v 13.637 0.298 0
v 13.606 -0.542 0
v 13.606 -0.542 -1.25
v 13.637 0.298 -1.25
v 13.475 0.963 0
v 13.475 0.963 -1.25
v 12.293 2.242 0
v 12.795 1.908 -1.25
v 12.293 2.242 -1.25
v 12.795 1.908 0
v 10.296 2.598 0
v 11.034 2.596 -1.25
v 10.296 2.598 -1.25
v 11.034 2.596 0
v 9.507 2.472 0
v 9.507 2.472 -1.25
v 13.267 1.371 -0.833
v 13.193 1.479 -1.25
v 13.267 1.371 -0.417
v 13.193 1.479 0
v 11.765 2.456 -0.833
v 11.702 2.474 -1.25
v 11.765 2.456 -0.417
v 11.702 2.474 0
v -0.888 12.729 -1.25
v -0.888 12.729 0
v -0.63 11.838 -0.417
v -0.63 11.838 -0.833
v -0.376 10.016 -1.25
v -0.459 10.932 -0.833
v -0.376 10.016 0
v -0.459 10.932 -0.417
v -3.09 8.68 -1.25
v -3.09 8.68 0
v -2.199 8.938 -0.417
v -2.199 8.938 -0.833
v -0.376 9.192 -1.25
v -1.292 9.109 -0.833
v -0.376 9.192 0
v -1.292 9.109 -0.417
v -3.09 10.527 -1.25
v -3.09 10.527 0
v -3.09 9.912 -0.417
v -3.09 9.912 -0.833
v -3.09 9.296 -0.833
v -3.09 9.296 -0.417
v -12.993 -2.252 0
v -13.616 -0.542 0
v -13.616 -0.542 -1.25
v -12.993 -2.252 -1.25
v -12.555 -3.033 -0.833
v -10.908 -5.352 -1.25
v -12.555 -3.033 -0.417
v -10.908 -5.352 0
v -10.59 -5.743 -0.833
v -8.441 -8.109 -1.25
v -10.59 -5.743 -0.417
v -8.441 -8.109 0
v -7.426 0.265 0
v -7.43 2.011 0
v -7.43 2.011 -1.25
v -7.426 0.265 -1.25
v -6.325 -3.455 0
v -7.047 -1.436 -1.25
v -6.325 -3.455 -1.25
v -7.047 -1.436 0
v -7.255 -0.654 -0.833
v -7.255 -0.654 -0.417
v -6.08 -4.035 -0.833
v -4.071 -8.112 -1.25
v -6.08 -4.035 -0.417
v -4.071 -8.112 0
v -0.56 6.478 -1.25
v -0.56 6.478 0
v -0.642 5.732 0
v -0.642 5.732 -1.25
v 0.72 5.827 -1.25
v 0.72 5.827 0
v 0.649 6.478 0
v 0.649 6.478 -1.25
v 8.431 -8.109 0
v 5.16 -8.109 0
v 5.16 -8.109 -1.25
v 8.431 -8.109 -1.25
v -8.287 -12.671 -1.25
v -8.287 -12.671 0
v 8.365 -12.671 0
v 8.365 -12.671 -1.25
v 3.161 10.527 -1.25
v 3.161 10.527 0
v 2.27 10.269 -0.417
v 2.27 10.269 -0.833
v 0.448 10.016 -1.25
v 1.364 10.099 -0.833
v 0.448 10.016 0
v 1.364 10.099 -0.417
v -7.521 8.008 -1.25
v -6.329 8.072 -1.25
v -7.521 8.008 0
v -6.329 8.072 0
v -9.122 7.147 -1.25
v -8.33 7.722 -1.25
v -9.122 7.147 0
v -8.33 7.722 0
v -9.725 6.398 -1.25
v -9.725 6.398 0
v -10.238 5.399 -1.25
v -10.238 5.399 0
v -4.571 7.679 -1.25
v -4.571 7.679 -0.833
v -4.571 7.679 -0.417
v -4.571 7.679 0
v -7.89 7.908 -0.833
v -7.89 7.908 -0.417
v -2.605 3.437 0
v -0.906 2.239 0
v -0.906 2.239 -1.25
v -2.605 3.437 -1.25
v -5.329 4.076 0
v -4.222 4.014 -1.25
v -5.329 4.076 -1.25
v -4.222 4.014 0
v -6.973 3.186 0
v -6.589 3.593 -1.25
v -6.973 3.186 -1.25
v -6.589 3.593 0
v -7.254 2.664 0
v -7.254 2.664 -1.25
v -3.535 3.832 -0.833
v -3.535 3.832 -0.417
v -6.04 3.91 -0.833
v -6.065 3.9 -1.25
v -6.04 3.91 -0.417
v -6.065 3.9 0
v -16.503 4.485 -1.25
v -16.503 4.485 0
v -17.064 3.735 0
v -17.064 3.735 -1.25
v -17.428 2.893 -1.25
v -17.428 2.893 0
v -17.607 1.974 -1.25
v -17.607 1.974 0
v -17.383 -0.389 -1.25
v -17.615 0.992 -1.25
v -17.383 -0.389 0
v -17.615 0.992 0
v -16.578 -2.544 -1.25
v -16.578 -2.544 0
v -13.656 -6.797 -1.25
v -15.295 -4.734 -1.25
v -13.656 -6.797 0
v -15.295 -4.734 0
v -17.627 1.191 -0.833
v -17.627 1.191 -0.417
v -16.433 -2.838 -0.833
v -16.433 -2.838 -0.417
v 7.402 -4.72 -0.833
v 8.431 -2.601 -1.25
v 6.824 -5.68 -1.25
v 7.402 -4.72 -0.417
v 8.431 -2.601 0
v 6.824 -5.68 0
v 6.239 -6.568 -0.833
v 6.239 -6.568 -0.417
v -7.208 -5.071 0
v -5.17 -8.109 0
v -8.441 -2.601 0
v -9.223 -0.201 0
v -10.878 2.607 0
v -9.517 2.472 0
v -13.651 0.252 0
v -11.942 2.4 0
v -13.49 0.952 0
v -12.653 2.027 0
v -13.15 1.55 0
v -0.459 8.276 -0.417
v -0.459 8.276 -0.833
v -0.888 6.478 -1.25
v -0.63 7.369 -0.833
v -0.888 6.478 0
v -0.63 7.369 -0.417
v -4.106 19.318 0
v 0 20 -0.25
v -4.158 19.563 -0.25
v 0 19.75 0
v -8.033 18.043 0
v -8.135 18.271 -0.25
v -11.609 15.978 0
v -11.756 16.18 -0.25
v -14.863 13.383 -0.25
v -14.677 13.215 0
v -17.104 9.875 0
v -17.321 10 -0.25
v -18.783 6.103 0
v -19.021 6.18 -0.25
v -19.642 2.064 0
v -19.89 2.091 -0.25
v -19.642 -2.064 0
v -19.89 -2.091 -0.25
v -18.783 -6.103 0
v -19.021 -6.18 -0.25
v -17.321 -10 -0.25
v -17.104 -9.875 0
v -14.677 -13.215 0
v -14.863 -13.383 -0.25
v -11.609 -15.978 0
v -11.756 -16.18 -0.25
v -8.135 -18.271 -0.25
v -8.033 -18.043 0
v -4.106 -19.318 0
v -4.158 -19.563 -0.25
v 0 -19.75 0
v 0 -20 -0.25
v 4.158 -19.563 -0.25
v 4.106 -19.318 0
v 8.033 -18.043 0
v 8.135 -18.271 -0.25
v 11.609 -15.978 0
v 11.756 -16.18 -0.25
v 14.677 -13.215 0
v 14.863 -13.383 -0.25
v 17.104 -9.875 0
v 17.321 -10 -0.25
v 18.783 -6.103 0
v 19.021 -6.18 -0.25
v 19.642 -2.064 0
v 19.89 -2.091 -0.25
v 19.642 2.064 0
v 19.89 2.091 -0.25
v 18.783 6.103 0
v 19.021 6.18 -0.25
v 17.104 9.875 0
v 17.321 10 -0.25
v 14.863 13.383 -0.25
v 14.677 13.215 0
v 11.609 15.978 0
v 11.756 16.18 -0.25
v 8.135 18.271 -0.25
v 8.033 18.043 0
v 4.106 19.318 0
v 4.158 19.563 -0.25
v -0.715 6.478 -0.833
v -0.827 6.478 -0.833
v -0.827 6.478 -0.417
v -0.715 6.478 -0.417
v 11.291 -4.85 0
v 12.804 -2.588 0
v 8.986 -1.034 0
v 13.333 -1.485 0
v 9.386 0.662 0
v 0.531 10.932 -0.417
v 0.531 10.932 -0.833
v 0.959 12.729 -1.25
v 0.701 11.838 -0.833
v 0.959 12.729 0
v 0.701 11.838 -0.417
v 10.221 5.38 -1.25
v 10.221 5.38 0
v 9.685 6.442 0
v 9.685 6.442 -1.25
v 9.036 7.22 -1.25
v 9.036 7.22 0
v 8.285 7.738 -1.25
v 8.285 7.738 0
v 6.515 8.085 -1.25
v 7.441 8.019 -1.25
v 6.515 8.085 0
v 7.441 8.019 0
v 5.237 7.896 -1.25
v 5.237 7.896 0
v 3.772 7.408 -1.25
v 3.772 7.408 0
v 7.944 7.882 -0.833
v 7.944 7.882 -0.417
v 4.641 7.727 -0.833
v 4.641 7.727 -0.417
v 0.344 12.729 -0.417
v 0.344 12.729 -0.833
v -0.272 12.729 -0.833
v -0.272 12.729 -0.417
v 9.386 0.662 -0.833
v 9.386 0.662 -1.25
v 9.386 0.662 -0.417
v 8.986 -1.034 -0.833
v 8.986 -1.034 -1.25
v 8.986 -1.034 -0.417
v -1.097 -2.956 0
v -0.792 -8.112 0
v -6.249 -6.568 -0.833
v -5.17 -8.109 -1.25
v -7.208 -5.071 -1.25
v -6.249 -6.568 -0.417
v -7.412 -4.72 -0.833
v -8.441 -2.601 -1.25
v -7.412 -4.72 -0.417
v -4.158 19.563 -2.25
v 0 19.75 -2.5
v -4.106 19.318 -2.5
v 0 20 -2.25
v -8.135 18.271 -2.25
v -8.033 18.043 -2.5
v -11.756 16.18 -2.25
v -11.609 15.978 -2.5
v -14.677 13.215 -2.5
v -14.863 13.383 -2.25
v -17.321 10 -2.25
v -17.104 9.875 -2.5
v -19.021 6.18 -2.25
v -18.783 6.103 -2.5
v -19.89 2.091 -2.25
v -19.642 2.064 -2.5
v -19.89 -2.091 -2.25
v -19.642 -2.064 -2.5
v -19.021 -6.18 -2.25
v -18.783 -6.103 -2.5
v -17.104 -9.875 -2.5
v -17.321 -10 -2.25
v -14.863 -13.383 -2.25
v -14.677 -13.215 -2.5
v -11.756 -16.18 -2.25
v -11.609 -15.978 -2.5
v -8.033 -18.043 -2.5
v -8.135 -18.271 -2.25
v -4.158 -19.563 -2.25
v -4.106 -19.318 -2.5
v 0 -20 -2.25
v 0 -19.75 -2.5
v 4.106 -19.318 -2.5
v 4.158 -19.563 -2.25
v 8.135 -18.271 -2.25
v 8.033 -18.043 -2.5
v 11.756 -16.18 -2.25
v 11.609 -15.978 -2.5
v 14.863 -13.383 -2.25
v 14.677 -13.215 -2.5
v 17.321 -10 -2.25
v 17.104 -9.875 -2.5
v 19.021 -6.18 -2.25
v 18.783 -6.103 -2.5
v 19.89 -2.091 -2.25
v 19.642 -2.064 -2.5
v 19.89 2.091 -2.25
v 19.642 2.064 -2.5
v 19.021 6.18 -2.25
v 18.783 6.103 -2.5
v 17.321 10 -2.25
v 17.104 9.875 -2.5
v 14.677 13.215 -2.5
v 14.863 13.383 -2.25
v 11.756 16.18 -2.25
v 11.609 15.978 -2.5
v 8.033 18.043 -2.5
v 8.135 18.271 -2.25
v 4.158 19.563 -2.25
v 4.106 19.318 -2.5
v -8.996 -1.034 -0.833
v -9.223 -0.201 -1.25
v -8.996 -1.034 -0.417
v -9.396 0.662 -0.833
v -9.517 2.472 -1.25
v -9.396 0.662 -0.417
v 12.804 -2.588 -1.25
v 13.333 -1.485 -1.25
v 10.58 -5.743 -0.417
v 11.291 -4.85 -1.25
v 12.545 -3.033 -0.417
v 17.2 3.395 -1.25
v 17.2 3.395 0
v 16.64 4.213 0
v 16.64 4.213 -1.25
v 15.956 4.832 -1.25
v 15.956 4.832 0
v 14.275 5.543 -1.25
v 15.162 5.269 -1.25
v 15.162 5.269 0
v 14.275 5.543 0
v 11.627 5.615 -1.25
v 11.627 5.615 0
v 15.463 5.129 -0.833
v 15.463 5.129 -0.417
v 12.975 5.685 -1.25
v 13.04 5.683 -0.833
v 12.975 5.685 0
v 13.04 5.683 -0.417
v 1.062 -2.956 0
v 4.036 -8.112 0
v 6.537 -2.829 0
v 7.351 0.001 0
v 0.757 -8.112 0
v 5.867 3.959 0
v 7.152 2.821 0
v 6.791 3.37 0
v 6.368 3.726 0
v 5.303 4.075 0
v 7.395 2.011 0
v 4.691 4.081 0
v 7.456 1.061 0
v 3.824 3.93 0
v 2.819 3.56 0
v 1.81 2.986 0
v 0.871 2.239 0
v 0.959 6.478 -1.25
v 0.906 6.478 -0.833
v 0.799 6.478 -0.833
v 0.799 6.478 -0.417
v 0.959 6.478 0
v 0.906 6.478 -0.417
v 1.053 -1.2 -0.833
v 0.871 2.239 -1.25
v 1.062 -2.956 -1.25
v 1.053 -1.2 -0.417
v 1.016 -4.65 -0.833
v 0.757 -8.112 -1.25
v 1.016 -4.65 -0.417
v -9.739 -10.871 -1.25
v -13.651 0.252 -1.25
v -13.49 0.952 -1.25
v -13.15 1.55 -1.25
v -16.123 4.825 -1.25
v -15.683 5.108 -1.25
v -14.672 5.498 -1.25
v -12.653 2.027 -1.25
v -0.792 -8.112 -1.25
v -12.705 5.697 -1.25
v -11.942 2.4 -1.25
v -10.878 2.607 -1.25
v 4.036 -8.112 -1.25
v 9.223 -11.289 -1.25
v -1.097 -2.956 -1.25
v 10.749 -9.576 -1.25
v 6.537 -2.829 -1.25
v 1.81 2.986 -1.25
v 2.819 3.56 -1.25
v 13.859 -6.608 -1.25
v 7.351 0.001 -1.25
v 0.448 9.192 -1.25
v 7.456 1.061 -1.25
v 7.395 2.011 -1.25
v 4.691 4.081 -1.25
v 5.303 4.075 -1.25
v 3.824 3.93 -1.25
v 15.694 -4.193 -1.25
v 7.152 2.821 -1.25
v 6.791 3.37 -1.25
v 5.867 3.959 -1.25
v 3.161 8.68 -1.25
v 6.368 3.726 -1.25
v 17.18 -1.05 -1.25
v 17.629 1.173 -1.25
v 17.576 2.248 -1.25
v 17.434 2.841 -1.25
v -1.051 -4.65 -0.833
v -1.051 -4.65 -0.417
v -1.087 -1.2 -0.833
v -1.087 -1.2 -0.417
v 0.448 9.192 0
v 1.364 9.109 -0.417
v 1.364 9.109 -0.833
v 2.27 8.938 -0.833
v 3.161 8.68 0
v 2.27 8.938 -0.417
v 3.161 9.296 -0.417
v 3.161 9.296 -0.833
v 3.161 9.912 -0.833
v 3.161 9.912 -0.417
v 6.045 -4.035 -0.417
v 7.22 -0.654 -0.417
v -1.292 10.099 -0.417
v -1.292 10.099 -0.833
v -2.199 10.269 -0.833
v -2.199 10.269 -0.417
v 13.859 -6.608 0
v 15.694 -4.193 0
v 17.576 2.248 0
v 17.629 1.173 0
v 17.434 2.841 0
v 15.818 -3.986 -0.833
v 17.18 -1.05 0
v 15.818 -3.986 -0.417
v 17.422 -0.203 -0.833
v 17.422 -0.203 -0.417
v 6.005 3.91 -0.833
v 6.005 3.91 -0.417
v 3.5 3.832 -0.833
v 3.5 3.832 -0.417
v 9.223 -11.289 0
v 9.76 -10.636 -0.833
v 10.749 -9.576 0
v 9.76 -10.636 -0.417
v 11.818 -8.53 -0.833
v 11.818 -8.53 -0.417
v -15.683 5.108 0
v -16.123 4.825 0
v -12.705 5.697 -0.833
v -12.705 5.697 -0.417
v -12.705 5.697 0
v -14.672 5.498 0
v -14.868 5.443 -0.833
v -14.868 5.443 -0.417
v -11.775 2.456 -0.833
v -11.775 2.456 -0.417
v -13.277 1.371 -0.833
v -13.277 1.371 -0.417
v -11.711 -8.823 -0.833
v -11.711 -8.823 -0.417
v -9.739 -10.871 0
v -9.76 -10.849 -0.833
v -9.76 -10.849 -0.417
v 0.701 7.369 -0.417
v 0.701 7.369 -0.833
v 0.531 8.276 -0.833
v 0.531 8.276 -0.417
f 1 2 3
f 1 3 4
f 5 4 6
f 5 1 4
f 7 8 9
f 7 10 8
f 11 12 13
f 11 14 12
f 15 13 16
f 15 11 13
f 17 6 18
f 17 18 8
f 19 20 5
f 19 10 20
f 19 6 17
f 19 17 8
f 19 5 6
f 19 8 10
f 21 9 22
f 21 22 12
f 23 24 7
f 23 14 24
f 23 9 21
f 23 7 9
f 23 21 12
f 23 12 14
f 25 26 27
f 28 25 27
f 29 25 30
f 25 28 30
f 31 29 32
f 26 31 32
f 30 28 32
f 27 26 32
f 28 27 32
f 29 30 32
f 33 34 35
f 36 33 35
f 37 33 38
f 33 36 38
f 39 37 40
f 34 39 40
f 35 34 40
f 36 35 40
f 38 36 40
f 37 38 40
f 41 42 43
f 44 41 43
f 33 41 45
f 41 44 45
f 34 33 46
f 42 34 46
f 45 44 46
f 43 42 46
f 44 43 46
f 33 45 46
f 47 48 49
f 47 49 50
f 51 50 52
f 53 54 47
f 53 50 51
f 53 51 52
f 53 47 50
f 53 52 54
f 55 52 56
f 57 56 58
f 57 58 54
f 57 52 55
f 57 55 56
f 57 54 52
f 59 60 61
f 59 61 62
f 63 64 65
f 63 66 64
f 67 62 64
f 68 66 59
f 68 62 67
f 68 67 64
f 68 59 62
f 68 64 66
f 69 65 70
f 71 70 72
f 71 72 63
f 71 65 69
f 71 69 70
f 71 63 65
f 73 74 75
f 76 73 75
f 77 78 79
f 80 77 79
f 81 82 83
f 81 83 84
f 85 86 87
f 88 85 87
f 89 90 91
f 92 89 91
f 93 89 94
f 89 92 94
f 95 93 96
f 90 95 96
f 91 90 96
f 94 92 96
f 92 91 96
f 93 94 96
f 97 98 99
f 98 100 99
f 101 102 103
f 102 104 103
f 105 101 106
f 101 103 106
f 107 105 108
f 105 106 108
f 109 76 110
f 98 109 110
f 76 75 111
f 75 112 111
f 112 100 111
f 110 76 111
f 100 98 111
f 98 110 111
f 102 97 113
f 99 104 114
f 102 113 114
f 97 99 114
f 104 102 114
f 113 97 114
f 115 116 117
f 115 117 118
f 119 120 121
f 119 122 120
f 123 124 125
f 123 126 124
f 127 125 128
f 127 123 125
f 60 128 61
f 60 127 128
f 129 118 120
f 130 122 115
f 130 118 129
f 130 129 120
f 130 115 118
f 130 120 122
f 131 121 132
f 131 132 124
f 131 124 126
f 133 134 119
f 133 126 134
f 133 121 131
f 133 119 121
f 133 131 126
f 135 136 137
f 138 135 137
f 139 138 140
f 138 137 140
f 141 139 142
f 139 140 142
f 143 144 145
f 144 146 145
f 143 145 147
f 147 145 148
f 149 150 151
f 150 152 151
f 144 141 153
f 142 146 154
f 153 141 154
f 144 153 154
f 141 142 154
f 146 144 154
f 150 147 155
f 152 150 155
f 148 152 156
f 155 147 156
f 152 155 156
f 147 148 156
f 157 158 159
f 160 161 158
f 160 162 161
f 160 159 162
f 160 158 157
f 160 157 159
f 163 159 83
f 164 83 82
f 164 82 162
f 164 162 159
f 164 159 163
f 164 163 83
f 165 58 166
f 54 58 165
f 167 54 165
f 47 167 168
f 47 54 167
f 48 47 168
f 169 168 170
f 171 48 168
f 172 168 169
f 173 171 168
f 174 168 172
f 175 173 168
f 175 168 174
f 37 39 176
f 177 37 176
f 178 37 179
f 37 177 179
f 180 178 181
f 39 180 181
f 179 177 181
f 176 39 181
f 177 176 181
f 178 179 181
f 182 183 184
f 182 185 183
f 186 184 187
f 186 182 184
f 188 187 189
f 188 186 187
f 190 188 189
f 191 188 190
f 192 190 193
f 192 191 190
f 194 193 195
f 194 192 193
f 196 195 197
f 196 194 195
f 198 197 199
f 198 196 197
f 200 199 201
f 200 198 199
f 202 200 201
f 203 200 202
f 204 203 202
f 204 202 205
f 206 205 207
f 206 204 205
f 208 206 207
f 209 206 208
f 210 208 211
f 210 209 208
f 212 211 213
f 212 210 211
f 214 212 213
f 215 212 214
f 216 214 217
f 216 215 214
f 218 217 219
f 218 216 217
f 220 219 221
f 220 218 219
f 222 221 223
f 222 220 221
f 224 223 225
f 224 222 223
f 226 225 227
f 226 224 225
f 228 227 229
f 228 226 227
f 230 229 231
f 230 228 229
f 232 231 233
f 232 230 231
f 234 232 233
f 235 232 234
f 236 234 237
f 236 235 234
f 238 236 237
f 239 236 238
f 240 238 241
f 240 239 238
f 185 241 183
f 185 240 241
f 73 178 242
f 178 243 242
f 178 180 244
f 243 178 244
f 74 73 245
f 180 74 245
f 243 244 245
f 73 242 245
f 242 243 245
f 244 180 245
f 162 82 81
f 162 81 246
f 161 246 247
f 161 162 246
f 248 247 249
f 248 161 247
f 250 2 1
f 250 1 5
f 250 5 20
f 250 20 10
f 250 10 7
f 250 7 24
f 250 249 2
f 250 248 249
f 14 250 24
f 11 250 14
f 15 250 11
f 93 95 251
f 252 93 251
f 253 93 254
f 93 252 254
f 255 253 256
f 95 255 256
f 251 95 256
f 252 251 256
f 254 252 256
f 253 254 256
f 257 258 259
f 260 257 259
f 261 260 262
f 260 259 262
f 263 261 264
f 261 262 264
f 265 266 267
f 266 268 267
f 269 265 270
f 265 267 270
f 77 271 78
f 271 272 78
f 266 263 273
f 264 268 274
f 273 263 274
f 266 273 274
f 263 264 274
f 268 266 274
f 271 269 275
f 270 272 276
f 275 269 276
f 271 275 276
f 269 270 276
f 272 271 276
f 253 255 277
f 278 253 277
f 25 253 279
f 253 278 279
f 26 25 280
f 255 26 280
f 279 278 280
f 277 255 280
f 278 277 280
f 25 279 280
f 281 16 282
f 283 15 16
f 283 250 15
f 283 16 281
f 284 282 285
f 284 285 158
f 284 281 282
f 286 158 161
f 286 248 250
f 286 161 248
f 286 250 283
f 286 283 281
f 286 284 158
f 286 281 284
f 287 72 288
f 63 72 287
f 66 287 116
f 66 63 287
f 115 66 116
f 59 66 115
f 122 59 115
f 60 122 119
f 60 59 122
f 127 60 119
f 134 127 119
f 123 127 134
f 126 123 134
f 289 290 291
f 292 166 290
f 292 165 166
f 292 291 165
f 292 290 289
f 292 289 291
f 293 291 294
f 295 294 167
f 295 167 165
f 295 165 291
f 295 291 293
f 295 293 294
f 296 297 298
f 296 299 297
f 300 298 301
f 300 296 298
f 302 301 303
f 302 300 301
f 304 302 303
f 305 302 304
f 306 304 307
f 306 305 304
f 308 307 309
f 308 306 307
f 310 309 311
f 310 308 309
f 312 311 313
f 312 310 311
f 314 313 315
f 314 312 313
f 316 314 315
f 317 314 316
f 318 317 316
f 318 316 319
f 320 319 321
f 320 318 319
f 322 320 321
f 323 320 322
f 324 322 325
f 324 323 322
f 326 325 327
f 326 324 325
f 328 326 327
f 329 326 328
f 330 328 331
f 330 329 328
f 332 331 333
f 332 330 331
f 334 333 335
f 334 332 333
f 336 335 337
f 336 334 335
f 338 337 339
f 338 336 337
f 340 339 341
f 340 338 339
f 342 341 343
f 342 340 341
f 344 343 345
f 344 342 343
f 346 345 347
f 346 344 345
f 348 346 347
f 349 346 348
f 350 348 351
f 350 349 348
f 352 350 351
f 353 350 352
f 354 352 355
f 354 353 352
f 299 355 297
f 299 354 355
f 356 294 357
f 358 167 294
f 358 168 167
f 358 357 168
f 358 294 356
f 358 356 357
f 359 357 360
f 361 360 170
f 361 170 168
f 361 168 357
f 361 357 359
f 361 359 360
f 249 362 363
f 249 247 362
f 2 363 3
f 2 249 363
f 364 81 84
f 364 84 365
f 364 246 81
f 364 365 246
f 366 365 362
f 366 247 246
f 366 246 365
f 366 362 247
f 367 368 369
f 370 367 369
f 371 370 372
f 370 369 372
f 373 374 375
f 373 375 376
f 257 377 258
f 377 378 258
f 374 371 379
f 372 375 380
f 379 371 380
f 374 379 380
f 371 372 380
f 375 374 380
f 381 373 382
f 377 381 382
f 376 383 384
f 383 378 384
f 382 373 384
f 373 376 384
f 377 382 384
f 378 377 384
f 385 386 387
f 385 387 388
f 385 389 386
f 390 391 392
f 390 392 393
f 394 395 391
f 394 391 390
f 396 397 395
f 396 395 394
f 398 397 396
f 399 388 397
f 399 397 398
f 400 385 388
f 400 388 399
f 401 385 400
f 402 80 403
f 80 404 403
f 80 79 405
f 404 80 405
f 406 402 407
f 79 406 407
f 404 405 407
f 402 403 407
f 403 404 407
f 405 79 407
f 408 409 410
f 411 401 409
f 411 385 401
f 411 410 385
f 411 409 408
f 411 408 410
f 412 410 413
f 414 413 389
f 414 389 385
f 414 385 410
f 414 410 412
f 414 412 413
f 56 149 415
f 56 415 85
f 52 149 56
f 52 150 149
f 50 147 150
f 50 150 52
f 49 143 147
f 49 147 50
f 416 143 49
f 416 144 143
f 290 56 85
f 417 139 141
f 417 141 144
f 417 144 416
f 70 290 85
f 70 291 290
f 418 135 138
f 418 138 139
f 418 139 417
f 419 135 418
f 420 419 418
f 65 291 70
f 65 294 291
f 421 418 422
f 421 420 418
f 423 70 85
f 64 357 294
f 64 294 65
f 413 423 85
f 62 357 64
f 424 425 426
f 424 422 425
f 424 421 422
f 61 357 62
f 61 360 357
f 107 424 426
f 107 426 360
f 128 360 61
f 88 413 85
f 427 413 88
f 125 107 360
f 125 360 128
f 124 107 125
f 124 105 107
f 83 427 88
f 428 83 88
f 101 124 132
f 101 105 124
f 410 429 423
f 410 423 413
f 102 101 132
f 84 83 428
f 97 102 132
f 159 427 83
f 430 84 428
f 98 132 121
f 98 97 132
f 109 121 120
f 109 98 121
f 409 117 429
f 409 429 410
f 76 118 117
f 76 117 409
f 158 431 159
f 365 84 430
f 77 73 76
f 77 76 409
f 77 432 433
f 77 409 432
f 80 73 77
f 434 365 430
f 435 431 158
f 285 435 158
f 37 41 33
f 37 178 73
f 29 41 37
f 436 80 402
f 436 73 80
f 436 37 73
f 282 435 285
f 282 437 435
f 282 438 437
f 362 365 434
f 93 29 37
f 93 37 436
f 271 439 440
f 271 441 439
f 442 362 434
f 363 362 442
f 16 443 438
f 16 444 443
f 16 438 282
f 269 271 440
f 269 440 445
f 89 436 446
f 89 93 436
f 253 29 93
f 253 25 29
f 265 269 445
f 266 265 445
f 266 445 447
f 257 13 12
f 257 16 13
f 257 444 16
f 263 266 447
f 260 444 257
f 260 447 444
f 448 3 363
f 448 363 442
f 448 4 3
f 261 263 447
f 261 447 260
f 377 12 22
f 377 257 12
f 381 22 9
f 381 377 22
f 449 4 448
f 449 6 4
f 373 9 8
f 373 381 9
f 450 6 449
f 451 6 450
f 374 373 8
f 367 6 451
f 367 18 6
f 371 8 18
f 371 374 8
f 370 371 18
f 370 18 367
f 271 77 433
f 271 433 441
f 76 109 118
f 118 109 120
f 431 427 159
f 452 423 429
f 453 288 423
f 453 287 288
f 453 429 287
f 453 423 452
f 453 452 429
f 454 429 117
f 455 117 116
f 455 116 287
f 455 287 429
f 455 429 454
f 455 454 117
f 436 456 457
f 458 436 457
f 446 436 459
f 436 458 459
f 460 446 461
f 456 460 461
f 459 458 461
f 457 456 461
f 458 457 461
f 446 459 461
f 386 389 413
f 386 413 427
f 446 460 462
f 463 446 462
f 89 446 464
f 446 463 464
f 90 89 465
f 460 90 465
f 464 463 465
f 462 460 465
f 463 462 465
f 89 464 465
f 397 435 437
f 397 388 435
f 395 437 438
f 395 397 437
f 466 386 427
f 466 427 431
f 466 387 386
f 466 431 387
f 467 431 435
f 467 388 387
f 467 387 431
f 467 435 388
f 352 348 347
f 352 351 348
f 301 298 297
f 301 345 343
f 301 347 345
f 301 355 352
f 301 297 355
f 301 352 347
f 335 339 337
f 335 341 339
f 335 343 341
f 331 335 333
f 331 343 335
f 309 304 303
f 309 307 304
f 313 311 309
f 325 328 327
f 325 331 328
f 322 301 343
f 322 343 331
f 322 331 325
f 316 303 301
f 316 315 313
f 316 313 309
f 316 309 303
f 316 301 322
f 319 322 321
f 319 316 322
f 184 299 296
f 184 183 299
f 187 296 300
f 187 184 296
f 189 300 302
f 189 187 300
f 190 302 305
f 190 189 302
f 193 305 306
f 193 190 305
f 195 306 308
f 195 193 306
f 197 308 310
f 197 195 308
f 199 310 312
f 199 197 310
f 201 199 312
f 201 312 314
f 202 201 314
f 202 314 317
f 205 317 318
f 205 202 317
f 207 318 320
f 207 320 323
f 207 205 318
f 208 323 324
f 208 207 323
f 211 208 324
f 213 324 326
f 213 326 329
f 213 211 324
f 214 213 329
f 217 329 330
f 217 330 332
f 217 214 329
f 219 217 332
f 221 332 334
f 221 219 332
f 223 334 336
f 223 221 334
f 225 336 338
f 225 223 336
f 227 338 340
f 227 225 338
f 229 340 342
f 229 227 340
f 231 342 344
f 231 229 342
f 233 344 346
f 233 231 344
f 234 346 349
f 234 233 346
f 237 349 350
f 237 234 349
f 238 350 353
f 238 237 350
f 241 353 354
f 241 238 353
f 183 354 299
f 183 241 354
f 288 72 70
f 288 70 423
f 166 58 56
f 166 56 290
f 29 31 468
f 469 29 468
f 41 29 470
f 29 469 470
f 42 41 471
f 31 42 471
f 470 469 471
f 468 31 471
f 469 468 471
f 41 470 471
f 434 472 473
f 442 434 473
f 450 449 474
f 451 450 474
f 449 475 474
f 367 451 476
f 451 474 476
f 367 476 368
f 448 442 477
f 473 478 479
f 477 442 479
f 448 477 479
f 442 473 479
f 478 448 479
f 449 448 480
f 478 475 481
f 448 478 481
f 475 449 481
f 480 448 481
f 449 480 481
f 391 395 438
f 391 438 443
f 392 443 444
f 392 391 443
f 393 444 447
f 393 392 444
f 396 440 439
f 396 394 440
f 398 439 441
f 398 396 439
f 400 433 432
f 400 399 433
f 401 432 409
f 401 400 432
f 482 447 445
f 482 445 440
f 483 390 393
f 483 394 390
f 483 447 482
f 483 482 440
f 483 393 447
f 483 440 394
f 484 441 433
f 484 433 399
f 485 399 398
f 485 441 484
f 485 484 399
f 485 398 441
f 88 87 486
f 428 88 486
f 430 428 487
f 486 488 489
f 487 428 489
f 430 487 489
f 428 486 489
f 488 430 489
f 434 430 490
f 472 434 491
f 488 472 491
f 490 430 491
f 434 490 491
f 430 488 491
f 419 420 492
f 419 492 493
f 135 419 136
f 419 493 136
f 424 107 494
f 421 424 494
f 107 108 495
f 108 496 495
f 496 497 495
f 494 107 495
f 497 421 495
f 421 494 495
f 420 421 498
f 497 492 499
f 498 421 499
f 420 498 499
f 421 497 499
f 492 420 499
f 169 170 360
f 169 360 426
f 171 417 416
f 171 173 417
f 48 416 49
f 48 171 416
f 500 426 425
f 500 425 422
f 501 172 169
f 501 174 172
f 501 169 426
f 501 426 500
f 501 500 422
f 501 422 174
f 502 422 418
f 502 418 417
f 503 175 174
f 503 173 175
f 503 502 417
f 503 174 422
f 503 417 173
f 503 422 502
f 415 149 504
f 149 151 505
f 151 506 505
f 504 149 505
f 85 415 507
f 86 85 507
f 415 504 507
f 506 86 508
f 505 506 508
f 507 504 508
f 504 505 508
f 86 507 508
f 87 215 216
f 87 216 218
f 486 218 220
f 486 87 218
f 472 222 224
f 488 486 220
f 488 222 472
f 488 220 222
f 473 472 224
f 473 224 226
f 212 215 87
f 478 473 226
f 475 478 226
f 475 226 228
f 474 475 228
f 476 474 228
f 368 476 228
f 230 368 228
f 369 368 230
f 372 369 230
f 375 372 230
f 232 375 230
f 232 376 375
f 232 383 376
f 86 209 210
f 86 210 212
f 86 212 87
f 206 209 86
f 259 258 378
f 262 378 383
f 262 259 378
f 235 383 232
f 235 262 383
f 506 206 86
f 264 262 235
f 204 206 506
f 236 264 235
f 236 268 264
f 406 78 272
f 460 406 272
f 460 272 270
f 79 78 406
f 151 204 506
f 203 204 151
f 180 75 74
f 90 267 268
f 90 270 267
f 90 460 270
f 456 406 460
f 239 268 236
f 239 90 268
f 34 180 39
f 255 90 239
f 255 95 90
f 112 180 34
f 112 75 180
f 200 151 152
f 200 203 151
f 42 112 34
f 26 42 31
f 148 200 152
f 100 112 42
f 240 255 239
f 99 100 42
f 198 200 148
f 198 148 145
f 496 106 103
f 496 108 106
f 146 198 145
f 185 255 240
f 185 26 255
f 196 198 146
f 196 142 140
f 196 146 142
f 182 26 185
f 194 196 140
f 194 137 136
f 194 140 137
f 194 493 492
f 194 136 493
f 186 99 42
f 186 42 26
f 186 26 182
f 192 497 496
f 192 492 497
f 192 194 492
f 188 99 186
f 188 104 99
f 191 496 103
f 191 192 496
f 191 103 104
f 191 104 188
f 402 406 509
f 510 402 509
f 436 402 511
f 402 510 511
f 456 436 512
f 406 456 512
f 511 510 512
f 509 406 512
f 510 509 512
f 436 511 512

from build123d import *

# Parameters (mm, degrees)
POCKET_DEPTH = 1.25


with BuildPart() as part:
    # Sketch (on DatumPlane) → Revolution (revolve)
    with BuildSketch(Plane.YZ):
        Polygon((0, 0), (0, -2.5), (19.75, -2.5), (20, -2.25), (20, -0.25), (19.75, 0), align=None)
    revolve(axis=Axis((0, 0, 0), (0, 0, 1)))

    # Sketch005 → Pocket (cut)
    with BuildSketch(Plane.XY):
        with BuildLine():
            add(Edge.make_bspline(
                [(17.199673, 3.39502), (15.904895, 5.827494), (13.139208, 6.003619), (10.22119, 5.380033)],
                knots=[0, 0, 0, 0, 1, 1, 1, 1], degree=3))
            add(Edge.make_bspline(
                [(10.22119, 5.380033), (8.593193, 9.516663), (4.81358, 8.293289), (0.719788, 5.827494)],
                knots=[0, 0, 0, 0, 1, 1, 1, 1], degree=3))
            add(Edge.make_bspline(
                [(0.719788, 5.827494), (0.649422, 6.478351)],
                knots=[0, 0, 41.237809, 41.237809], degree=1))
            add(Edge.make_bspline(
                [(0.649422, 6.478351), (0.817118, 6.478351), (0.936272, 6.478351), (0.959337, 6.478351)],
                knots=[0, 0, 0, 0, 1, 1, 1, 1], degree=3))
            add(Edge.make_bspline(
                [(0.959337, 6.478351), (0.65764, 7.35953), (0.487238, 8.273468), (0.447992, 9.191671)],
                knots=[0, 0, 0, 0, 1, 1, 1, 1], degree=3))
            add(Edge.make_bspline(
                [(0.447992, 9.191671), (1.366194, 9.152423), (2.280132, 8.982021), (3.16131, 8.680326)],
                knots=[0, 0, 0, 0, 1, 1, 1, 1], degree=3))
            add(Edge.make_bspline(
                [(3.16131, 8.680326), (3.16131, 9.295984), (3.16131, 9.911639), (3.16131, 10.527295)],
                knots=[0, 0, 0, 0, 1, 1, 1, 1], degree=3))
            add(Edge.make_bspline(
                [(3.16131, 10.527295), (2.280132, 10.225599), (1.366194, 10.055198), (0.447992, 10.01595)],
                knots=[0, 0, 0, 0, 1, 1, 1, 1], degree=3))
            add(Edge.make_bspline(
                [(0.447992, 10.01595), (0.487238, 10.934154), (0.65764, 11.848094), (0.959337, 12.729271)],
                knots=[0, 0, 0, 0, 1, 1, 1, 1], degree=3))
            add(Edge.make_bspline(
                [(0.959337, 12.729271), (0.343681, 12.729271), (-0.271977, 12.729271), (-0.887634, 12.729271)],
                knots=[0, 0, 0, 0, 1, 1, 1, 1], degree=3))
            add(Edge.make_bspline(
                [(-0.887634, 12.729271), (-0.585937, 11.848092), (-0.415537, 10.934152), (-0.376289, 10.01595)],
                knots=[0, 0, 0, 0, 1, 1, 1, 1], degree=3))
            add(Edge.make_bspline(
                [(-0.376289, 10.01595), (-1.294491, 10.055198), (-2.20843, 10.2256), (-3.089607, 10.527295)],
                knots=[0, 0, 0, 0, 1, 1, 1, 1], degree=3))
            add(Edge.make_bspline(
                [(-3.089607, 10.527295), (-3.089607, 9.911639), (-3.089607, 9.295983), (-3.089607, 8.680326)],
                knots=[0, 0, 0, 0, 1, 1, 1, 1], degree=3))
            add(Edge.make_bspline(
                [(-3.089607, 8.680326), (-2.20843, 8.982023), (-1.294491, 9.152423), (-0.376289, 9.191671)],
                knots=[0, 0, 0, 0, 1, 1, 1, 1], degree=3))
            add(Edge.make_bspline(
                [(-0.376289, 9.191671), (-0.415537, 8.273468), (-0.585937, 7.359528), (-0.887634, 6.478351)],
                knots=[0, 0, 0, 0, 1, 1, 1, 1], degree=3))
            add(Edge.make_bspline(
                [(-0.887634, 6.478351), (-0.857358, 6.478351), (-0.732021, 6.478351), (-0.559748, 6.478351)],
                knots=[0, 0, 0, 0, 1, 1, 1, 1], degree=3))
            add(Edge.make_bspline(
                [(-0.559748, 6.478351), (-0.641636, 5.73229)],
                knots=[0, 0, 47.278241, 47.278241], degree=1))
            add(Edge.make_bspline(
                [(-0.641636, 5.73229), (-4.754593, 8.196928), (-8.497006, 9.617448), (-10.238244, 5.399072)],
                knots=[0, 0, 0, 0, 1, 1, 1, 1], degree=3))
            add(Edge.make_bspline(
                [(-10.238244, 5.399072), (-12.781371, 5.921869), (-15.207916, 5.846532), (-16.502695, 4.485108)],
                knots=[0, 0, 0, 0, 1, 1, 1, 1], degree=3))
            add(Edge.make_bspline(
                [(-16.502695, 4.485108), (-19.031136, 1.826532), (-16.97872, -3.140769), (-13.656084, -6.796618)],
                knots=[0, 0, 0, 0, 1, 1, 1, 1], degree=3))
            add(Edge.make_bspline(
                [(-13.656084, -6.796618), (-11.875374, -8.755908), (-9.359237, -11.018558), (-8.286551, -12.670729)],
                knots=[0, 0, 0, 0, 1, 1, 1, 1], degree=3))
            add(Edge.make_bspline(
                [(-8.286551, -12.670729), (8.364704, -12.670729)],
                knots=[0, 0, 1048.89791, 1048.89791], degree=1))
            add(Edge.make_bspline(
                [(8.364704, -12.670729), (9.202504, -10.757117), (12.053892, -8.352741), (13.859035, -6.607594)],
                knots=[0, 0, 0, 0, 1, 1, 1, 1], degree=3))
            add(Edge.make_bspline(
                [(13.859035, -6.607594), (15.505033, -5.01629), (18.826551, 0.33865), (17.199673, 3.39502)],
                knots=[0, 0, 0, 0, 1, 1, 1, 1], degree=3))
        make_face()
        with BuildLine():
            add(Edge.make_bspline(
                [(9.506608, 2.472112), (9.566387, 0.610416), (9.023596, -1.104203), (8.43058, -2.600588)],
                knots=[0, 0, 0, 0, 1, 1, 1, 1], degree=3))
            add(Edge.make_bspline(
                [(8.43058, -2.600588), (7.541741, -4.843446), (6.124803, -6.733903), (5.159797, -8.108826)],
                knots=[0, 0, 0, 0, 1, 1, 1, 1], degree=3))
            add(Edge.make_bspline(
                [(5.159797, -8.108826), (8.43058, -8.108826)],
                knots=[0, 0, 206.0336, 206.0336], degree=1))
            add(Edge.make_bspline(
                [(8.43058, -8.108826), (10.431762, -6.10195), (13.237427, -2.736096), (13.605757, -0.542472)],
                knots=[0, 0, 0, 0, 1, 1, 1, 1], degree=3))
            add(Edge.make_bspline(
                [(13.605757, -0.542472), (13.983087, 1.704704), (12.0088, 3.069906), (9.506608, 2.472112)],
                knots=[0, 0, 0, 0, 1, 1, 1, 1], degree=3))
        make_face(mode=Mode.SUBTRACT)
        with BuildLine():
            add(Edge.make_bspline(
                [(7.395219, 2.010956), (6.894209, 5.051162), (3.230589, 4.436291), (0.870734, 2.238688)],
                knots=[0, 0, 0, 0, 1, 1, 1, 1], degree=3))
            add(Edge.make_bspline(
                [(0.870734, 2.238688), (1.159981, -1.194989), (1.12982, -4.644717), (0.756864, -8.111676)],
                knots=[0, 0, 0, 0, 1, 1, 1, 1], degree=3))
            add(Edge.make_bspline(
                [(0.756864, -8.111676), (0.756864, -8.111677)],
                knots=[0, 0, 0.0001, 0.0001], degree=1))
            add(Edge.make_bspline(
                [(0.756864, -8.111677), (4.03619, -8.111677)],
                knots=[0, 0, 206.5717, 206.5717], degree=1))
            add(Edge.make_bspline(
                [(4.03619, -8.111677), (6.407437, -3.693701), (7.774117, -0.288253), (7.395219, 2.010956)],
                knots=[0, 0, 0, 0, 1, 1, 1, 1], degree=3))
        make_face(mode=Mode.SUBTRACT)
        with BuildLine():
            add(Edge.make_bspline(
                [(-9.516603, 2.472114), (-12.018792, 3.069908), (-13.99308, 1.704704), (-13.615756, -0.542474)],
                knots=[0, 0, 0, 0, 1, 1, 1, 1], degree=3))
            add(Edge.make_bspline(
                [(-13.615756, -0.542474), (-13.247425, -2.736097), (-10.441758, -6.101951), (-8.440576, -8.108828)],
                knots=[0, 0, 0, 0, 1, 1, 1, 1], degree=3))
            add(Edge.make_bspline(
                [(-8.440576, -8.108828), (-5.169793, -8.108828)],
                knots=[0, 0, 206.0336, 206.0336], degree=1))
            add(Edge.make_bspline(
                [(-5.169793, -8.108828), (-6.134802, -6.733903), (-7.551735, -4.843448), (-8.440576, -2.600593)],
                knots=[0, 0, 0, 0, 1, 1, 1, 1], degree=3))
            add(Edge.make_bspline(
                [(-8.440576, -2.600593), (-9.03359, -1.104203), (-9.576383, 0.610415), (-9.516603, 2.472114)],
                knots=[0, 0, 0, 0, 1, 1, 1, 1], degree=3))
        make_face(mode=Mode.SUBTRACT)
        with BuildLine():
            add(Edge.make_bspline(
                [(-0.905534, 2.238688), (-3.265394, 4.436293), (-6.929014, 5.051165), (-7.430021, 2.010958)],
                knots=[0, 0, 0, 0, 1, 1, 1, 1], degree=3))
            add(Edge.make_bspline(
                [(-7.430021, 2.010958), (-7.808915, -0.288249), (-6.442239, -3.693696), (-4.070992, -8.111676)],
                knots=[0, 0, 0, 0, 1, 1, 1, 1], degree=3))
            add(Edge.make_bspline(
                [(-4.070992, -8.111676), (-0.791666, -8.111676)],
                knots=[0, 0, 206.57171, 206.57171], degree=1))
            add(Edge.make_bspline(
                [(-0.791666, -8.111676), (-1.164621, -4.644717), (-1.194783, -1.194989), (-0.905534, 2.238688)],
                knots=[0, 0, 0, 0, 1, 1, 1, 1], degree=3))
        make_face(mode=Mode.SUBTRACT)
    extrude(amount=-POCKET_DEPTH, mode=Mode.SUBTRACT)


solid = part.part
